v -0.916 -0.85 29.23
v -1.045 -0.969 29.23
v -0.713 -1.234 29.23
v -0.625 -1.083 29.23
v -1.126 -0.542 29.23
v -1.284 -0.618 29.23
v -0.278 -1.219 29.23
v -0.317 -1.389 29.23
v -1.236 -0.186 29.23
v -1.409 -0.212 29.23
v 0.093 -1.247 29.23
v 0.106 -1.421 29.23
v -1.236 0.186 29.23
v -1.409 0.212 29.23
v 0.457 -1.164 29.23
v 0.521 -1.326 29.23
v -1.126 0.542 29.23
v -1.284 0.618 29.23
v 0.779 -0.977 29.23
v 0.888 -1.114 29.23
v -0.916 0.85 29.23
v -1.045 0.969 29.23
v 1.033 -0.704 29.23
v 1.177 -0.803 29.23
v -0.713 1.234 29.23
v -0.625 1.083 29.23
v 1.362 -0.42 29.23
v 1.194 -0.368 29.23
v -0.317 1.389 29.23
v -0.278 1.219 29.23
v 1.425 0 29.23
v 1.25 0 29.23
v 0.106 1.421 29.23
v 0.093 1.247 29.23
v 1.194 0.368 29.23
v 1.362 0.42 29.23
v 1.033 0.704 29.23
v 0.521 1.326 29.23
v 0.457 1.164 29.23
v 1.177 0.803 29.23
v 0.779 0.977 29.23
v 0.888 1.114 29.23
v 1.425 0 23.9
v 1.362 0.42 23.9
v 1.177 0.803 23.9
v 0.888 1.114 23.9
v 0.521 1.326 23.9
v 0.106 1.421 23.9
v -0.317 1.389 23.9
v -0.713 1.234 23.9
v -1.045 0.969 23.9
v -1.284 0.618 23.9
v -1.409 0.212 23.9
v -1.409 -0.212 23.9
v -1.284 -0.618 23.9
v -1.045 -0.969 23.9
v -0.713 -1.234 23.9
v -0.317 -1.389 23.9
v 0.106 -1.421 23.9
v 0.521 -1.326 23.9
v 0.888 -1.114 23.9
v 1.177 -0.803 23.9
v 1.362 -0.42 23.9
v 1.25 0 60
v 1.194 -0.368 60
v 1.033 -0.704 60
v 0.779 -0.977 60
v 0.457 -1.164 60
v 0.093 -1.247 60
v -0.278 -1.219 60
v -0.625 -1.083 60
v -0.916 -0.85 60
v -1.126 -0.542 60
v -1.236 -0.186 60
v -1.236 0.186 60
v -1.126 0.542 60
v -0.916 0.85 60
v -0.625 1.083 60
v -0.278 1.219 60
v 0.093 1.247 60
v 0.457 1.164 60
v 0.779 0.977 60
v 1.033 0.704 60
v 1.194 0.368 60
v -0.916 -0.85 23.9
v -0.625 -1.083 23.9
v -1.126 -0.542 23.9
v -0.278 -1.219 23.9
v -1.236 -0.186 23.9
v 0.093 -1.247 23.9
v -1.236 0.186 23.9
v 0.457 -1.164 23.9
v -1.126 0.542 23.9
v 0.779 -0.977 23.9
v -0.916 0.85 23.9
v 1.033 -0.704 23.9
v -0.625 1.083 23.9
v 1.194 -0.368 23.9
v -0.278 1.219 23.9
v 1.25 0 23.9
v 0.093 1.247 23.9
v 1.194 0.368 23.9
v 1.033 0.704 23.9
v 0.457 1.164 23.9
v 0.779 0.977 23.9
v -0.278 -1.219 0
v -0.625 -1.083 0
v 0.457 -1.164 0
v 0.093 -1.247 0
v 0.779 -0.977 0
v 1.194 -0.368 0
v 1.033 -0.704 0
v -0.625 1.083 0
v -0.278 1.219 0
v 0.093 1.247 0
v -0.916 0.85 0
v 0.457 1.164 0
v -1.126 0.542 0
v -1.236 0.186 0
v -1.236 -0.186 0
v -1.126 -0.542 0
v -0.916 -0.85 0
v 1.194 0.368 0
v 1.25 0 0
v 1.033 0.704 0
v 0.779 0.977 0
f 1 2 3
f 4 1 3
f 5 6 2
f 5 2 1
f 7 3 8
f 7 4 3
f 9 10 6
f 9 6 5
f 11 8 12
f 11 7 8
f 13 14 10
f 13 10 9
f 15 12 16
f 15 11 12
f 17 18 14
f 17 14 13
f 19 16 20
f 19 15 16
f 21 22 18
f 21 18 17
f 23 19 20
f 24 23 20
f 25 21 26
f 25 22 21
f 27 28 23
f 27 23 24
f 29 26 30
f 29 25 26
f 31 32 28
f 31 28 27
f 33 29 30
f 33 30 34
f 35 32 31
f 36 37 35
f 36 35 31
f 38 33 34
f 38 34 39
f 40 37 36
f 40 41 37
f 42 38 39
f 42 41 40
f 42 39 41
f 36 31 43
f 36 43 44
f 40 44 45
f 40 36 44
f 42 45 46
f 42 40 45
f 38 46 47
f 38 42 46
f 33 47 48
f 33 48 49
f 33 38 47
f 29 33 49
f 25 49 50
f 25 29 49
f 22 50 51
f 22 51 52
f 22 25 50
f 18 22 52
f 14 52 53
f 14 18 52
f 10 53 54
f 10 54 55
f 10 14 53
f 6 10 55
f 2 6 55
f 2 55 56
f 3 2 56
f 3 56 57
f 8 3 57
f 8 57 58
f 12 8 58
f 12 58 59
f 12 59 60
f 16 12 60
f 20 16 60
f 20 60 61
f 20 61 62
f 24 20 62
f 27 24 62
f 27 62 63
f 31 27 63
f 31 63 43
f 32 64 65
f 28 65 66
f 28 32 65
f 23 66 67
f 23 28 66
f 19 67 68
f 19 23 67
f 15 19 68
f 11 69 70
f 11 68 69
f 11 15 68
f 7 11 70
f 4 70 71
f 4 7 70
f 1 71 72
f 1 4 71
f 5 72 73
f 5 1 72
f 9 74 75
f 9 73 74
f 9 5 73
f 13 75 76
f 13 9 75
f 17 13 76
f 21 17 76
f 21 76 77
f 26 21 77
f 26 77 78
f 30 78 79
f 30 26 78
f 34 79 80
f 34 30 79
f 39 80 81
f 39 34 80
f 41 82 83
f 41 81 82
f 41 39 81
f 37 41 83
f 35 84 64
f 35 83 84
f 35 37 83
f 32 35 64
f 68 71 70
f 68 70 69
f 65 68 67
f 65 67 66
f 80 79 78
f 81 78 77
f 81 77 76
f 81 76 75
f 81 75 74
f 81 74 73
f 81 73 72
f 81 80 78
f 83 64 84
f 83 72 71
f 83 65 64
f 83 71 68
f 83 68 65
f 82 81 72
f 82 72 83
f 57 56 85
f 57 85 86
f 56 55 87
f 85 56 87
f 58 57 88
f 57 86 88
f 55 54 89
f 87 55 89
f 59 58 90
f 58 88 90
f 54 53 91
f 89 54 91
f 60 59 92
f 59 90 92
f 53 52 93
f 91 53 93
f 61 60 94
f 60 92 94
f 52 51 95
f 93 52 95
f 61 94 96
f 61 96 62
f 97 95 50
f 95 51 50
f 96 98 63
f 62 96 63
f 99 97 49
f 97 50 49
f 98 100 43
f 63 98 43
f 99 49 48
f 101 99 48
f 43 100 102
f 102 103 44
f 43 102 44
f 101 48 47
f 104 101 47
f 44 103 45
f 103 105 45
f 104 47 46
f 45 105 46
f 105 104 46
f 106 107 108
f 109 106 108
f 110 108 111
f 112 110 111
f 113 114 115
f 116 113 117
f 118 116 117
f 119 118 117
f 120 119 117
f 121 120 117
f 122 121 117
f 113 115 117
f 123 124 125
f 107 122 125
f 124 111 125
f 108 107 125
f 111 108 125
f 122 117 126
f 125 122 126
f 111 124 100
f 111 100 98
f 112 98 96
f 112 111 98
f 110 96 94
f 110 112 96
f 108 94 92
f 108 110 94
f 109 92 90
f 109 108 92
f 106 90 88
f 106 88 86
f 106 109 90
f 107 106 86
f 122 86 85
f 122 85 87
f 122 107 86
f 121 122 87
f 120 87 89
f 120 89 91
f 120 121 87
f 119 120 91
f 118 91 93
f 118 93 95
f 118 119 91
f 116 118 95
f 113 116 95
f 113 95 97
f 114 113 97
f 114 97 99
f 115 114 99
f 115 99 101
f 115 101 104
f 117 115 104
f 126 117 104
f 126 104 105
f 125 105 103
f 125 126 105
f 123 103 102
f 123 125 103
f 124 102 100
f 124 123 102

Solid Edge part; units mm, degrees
sketch "Sketch1" plane through (0, 0, 0) normal (0, 0, 1) x (1, 0, 0)
  circle A0 centre (0, 0) radius 1.25
extrude "Protrusion1" add sketch "Sketch1" along normal blind 60
sketch "Sketch2" plane through (0, 0, 29.23) normal (0, 0, 1) x (1, 0, 0)
  circle A0 centre (0, 0) radius 1.425
extrude "ExtrudedProtrusion_2" add sketch "Sketch2" against normal blind 5.33
